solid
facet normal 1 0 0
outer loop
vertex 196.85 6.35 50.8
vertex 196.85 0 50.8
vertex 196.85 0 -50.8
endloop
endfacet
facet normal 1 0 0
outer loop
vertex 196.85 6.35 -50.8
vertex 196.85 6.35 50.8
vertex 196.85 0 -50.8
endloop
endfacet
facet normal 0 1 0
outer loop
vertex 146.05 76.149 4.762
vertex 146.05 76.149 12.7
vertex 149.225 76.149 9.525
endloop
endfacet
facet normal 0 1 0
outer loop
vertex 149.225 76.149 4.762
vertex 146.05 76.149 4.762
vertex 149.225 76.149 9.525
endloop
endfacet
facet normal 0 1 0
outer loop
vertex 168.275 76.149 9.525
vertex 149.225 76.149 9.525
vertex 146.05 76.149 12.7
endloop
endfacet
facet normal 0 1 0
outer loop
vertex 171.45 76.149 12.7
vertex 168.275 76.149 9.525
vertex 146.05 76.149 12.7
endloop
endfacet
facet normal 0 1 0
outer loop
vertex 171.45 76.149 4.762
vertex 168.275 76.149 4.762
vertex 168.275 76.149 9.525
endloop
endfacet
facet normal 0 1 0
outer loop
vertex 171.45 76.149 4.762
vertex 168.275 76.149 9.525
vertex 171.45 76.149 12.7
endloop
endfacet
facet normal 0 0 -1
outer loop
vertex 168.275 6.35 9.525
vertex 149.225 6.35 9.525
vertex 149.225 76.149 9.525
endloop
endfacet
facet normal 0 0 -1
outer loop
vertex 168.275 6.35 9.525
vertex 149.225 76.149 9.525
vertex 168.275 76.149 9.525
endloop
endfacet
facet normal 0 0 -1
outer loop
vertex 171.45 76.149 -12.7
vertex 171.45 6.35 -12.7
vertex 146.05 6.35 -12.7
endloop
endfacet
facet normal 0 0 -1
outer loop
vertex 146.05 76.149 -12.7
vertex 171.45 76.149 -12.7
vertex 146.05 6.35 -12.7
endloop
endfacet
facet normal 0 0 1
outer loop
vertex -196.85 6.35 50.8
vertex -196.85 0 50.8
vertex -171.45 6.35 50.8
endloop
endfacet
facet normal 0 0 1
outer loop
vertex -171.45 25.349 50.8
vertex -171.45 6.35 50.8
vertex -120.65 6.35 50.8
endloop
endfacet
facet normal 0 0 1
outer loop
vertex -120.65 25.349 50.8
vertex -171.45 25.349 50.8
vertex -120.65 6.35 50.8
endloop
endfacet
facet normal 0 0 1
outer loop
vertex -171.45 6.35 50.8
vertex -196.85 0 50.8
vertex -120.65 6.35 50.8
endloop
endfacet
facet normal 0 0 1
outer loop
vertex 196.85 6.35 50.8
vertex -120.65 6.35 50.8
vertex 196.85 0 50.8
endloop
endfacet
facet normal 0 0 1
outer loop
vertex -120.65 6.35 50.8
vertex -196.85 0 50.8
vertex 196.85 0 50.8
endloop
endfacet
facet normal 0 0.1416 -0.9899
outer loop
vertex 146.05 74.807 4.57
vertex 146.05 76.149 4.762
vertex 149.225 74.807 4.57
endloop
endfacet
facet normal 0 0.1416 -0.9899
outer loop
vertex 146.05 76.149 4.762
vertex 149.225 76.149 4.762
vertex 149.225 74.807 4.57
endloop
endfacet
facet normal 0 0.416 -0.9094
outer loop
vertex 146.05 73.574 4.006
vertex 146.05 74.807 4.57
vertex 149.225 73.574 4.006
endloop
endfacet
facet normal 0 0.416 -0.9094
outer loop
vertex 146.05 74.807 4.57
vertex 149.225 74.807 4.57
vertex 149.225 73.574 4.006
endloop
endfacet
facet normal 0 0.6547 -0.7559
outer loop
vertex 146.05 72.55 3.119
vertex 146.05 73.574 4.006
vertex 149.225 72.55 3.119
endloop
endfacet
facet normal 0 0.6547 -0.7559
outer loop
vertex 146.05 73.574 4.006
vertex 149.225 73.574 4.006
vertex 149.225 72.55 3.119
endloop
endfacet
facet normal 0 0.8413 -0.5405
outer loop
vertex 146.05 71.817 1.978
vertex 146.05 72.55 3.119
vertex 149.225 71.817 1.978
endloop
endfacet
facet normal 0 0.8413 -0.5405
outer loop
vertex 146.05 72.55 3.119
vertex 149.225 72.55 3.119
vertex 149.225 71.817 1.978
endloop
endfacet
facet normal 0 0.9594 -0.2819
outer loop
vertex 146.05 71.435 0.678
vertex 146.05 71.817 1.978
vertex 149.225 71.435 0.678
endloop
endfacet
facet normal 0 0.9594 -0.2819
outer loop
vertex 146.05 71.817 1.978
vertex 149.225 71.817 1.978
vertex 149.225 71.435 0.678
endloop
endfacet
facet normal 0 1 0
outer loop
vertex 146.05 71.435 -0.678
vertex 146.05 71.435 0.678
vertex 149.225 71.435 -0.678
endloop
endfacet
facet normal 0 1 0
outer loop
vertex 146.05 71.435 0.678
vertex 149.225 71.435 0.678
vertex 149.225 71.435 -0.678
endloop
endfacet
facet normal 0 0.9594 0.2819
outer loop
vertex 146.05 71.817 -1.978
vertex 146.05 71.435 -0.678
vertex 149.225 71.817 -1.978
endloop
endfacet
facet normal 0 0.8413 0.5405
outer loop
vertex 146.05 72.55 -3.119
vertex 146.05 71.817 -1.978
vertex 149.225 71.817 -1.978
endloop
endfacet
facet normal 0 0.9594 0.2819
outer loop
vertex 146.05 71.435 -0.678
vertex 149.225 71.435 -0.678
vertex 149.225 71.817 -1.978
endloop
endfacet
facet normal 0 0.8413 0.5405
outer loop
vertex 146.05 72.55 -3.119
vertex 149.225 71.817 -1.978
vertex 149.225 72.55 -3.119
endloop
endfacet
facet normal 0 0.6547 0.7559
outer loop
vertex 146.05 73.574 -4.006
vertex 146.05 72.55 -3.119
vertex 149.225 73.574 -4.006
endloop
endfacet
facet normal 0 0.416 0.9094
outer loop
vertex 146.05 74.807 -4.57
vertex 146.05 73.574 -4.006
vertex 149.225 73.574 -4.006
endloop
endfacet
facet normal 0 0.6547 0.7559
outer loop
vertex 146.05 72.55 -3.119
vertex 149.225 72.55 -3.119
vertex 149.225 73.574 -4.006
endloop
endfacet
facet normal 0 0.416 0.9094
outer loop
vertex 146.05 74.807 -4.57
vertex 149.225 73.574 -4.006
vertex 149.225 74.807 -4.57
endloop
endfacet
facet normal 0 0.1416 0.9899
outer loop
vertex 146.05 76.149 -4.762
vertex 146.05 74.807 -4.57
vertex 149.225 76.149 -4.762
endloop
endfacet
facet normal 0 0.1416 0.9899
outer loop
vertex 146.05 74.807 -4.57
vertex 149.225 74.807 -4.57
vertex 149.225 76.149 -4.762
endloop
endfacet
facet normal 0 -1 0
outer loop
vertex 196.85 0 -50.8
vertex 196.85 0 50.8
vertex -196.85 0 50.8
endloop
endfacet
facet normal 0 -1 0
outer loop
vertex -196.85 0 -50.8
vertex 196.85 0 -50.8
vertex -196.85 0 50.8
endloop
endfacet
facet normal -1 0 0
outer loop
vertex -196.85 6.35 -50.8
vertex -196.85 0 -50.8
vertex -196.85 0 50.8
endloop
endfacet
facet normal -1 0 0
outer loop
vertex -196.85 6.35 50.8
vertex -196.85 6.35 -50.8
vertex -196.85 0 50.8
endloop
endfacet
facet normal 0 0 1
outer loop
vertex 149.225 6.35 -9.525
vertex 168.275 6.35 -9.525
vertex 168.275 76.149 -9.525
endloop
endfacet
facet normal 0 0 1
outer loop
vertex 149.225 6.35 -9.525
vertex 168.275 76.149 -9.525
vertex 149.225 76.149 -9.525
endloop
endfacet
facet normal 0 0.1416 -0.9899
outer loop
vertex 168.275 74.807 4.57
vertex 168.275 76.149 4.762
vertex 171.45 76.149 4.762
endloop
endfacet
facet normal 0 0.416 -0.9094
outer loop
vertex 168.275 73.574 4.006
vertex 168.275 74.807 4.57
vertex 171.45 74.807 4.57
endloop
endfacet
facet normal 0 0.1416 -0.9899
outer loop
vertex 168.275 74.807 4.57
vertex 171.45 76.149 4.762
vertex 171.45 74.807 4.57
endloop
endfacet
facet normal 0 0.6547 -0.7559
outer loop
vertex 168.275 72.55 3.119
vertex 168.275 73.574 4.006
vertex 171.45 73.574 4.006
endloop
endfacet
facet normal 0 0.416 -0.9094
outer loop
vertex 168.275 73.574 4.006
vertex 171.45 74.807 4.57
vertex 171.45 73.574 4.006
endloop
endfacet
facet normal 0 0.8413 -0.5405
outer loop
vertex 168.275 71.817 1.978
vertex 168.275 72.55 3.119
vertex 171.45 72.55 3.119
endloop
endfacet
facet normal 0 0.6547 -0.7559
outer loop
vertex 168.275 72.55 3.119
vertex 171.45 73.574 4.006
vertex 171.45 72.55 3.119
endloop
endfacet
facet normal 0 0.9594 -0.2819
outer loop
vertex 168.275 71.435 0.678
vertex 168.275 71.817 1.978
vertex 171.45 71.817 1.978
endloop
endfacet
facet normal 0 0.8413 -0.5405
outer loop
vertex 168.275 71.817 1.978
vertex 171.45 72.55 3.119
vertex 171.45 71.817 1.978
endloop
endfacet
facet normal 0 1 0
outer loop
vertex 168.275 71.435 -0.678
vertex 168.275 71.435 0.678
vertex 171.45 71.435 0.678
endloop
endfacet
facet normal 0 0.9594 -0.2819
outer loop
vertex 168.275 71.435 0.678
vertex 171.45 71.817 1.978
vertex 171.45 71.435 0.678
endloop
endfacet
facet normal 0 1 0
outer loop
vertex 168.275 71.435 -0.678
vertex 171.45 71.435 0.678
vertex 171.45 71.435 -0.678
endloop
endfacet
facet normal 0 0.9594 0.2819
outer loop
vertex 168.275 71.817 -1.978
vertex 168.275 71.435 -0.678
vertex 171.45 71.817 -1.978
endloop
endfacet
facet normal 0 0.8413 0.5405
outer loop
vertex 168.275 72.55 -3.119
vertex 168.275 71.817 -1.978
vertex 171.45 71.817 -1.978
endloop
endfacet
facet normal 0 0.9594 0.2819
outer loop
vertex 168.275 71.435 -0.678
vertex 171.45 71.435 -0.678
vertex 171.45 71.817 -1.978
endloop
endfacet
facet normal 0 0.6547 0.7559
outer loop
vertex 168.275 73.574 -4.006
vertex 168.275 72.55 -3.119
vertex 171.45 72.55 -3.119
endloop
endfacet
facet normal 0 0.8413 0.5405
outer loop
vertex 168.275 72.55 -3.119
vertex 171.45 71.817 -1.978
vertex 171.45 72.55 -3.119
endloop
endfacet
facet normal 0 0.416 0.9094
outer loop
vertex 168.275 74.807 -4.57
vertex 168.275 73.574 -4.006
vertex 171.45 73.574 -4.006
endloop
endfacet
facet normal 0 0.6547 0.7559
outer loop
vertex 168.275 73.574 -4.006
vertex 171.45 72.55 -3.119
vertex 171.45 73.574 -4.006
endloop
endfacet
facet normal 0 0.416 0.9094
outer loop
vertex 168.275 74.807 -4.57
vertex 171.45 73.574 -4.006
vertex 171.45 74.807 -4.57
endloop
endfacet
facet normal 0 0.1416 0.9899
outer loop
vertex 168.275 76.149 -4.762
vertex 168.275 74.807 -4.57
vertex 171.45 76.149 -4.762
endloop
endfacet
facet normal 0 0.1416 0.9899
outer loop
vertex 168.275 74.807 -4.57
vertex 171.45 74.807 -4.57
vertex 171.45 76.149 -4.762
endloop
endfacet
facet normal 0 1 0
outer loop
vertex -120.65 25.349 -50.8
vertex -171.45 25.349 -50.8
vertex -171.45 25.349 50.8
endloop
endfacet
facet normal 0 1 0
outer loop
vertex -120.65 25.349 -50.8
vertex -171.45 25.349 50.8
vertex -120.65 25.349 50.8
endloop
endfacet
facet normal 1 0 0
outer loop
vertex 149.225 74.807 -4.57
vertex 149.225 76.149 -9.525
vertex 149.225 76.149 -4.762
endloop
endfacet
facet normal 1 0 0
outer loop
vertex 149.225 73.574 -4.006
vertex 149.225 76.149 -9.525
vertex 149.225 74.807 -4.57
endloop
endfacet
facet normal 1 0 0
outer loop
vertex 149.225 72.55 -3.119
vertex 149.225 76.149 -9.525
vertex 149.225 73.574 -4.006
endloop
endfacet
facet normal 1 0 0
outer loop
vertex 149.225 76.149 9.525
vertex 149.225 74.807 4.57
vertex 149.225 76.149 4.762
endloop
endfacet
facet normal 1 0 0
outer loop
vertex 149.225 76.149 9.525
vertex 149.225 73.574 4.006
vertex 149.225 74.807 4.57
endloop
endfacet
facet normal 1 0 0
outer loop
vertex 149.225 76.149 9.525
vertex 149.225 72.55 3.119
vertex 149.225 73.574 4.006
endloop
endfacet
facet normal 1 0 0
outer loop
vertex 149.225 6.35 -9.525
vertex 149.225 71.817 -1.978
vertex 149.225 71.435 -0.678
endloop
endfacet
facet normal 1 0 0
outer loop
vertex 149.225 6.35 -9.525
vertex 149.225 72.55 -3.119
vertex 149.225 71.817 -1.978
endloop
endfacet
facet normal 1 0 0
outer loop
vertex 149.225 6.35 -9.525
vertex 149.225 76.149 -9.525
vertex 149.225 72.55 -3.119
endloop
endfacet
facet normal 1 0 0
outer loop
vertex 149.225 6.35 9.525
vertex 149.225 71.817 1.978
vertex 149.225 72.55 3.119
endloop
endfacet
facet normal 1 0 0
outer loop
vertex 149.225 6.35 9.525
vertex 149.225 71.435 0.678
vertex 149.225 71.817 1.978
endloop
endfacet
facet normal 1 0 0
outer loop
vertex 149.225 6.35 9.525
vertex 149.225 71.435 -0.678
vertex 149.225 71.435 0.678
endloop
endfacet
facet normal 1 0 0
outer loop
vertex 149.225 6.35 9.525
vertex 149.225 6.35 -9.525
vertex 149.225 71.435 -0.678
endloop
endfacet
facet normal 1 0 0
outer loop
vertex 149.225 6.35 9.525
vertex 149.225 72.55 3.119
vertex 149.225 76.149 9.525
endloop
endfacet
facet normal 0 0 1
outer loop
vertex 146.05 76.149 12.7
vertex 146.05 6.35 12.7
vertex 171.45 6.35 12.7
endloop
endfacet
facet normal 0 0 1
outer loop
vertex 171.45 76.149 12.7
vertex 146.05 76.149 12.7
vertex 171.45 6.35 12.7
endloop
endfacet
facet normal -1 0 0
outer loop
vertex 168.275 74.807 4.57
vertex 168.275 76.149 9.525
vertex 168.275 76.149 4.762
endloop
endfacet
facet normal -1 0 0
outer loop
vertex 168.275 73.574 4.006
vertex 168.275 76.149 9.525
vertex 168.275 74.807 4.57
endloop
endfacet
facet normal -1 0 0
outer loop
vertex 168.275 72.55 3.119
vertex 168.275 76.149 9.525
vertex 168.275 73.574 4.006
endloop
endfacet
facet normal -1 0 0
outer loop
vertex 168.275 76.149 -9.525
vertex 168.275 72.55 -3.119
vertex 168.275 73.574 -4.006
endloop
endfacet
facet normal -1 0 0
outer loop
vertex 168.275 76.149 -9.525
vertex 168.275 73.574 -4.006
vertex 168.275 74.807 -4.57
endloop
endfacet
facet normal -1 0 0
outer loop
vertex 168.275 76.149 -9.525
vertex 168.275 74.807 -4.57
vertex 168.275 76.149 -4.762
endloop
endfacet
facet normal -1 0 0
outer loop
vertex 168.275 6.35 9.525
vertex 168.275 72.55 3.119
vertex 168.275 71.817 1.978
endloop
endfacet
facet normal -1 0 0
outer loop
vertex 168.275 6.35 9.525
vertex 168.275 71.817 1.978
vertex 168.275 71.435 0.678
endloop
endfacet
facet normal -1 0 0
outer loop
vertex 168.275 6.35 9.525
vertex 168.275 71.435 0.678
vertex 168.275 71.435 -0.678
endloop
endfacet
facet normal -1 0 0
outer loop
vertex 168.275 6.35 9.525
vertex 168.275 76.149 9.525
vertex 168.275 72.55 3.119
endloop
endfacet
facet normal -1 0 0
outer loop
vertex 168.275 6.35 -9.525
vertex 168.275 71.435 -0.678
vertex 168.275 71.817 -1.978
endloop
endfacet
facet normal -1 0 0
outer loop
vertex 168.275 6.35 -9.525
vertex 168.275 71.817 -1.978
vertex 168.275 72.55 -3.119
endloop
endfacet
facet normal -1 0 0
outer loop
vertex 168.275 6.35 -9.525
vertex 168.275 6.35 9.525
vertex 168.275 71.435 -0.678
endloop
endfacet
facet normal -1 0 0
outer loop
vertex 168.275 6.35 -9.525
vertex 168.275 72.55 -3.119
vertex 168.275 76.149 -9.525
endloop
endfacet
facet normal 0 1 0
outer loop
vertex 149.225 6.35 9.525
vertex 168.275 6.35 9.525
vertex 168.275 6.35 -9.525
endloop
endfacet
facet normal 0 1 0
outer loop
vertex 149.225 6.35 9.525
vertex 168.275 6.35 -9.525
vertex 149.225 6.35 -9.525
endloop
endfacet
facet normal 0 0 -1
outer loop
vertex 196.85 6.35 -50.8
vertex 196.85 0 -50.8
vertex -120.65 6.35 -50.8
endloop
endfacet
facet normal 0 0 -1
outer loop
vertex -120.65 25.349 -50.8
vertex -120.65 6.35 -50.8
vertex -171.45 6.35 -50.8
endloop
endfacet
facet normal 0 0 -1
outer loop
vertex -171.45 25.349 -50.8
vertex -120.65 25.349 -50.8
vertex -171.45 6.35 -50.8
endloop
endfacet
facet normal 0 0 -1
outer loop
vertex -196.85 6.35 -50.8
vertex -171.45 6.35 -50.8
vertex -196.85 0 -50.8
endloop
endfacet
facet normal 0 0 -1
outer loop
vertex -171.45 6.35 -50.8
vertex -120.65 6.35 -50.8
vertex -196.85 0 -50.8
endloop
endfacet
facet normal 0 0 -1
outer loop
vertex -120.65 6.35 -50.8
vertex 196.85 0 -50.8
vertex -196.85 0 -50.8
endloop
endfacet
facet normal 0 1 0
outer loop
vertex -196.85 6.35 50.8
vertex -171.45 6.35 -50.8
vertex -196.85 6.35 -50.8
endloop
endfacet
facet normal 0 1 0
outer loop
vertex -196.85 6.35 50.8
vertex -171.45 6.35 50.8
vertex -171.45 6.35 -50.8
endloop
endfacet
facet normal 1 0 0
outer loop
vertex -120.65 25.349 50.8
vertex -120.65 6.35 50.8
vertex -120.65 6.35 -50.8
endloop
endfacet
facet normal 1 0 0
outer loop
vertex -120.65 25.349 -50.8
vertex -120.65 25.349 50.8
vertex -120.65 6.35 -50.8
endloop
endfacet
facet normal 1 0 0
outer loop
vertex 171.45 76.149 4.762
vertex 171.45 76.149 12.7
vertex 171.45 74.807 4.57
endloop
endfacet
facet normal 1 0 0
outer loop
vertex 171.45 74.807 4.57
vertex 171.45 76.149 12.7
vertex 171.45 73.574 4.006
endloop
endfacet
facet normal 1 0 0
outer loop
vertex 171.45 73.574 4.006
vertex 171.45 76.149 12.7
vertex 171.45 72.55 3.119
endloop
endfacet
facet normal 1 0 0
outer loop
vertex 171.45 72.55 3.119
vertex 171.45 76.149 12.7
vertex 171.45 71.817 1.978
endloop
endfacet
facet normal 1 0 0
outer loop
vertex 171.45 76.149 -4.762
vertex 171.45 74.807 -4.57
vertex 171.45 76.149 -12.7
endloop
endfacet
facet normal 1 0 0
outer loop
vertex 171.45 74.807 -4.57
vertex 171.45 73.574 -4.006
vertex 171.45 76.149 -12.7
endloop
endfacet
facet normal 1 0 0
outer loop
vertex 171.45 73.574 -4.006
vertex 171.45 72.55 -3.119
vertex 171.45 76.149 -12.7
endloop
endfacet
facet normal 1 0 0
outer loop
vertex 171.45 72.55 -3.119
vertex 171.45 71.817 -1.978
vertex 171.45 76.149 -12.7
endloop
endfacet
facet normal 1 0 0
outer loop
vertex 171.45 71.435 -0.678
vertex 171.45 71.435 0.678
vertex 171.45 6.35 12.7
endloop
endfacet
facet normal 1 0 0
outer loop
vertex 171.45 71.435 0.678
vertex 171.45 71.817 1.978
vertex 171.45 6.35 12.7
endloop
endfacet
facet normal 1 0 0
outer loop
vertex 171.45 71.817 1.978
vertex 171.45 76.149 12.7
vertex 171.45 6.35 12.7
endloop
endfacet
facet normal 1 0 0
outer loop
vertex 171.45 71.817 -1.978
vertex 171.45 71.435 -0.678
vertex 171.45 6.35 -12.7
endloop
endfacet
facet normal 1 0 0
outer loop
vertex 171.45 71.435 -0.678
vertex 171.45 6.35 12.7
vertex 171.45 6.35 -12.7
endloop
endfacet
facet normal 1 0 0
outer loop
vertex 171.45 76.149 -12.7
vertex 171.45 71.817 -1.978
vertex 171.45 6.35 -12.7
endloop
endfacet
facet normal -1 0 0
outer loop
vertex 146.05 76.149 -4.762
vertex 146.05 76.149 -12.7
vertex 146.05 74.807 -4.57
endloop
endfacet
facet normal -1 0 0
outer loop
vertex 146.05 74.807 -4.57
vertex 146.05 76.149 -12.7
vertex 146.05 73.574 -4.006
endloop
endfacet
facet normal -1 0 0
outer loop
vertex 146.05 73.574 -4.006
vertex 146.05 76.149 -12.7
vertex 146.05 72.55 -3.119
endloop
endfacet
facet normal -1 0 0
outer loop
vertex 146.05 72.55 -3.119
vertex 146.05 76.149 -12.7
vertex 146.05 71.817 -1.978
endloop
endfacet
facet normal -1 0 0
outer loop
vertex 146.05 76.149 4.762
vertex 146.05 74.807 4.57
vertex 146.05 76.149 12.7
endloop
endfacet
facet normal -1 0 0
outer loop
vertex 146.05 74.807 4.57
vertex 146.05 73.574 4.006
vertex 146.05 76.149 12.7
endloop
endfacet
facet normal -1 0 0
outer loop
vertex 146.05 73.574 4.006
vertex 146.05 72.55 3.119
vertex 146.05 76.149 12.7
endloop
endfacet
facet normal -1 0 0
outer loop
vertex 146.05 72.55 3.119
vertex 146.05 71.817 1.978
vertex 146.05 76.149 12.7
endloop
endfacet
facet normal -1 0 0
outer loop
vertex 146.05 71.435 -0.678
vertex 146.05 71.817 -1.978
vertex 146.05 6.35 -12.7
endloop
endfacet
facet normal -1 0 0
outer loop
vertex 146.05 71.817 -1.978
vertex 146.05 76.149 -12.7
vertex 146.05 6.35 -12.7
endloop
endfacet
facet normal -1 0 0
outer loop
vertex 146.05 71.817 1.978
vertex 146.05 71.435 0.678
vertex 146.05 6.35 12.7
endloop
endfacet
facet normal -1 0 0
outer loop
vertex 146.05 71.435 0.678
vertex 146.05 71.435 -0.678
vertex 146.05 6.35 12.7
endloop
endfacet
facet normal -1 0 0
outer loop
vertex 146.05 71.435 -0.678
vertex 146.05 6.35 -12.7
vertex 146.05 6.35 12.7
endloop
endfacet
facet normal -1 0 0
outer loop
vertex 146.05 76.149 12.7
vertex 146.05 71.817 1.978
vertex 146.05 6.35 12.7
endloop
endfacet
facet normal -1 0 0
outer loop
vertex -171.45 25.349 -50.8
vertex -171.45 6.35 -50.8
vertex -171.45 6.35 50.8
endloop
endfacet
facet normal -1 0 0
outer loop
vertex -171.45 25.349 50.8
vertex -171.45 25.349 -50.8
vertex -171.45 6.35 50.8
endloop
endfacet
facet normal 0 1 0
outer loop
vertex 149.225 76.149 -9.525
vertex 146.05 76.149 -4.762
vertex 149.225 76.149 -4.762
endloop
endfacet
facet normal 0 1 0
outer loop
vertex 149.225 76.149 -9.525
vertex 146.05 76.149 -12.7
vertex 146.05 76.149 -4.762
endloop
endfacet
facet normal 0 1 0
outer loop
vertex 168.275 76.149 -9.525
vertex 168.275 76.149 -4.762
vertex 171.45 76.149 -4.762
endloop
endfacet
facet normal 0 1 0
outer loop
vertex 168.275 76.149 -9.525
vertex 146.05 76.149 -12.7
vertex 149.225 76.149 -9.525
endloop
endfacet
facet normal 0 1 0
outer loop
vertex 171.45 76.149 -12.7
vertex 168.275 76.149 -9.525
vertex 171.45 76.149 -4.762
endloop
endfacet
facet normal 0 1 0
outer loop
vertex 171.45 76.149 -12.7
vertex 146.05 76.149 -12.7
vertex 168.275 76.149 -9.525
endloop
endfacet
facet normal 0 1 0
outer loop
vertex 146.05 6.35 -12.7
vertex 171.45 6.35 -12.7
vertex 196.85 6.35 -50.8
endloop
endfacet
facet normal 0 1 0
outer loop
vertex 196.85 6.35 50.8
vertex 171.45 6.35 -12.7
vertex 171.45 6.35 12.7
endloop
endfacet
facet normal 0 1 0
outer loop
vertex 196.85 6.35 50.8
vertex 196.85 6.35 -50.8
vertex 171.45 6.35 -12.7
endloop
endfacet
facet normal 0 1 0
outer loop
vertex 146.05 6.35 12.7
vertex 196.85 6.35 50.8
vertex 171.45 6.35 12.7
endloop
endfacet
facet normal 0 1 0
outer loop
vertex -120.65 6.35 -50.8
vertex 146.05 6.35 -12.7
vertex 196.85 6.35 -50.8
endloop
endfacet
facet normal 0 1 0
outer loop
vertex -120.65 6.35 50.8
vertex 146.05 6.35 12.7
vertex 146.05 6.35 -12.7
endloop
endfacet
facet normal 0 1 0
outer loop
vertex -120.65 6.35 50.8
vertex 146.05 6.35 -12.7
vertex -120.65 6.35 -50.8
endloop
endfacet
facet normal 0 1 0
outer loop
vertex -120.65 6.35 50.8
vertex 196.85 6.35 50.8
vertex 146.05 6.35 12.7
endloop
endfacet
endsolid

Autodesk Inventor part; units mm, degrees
ref_plane "XZ Plane" through (0, 0, 0) normal (0, 1, 0) x (-1, 0, 0)
sketch "Sketch1" plane through (0, 0, 0) normal (0, 1, 0) x (-1, 0, 0)
  line L0 (196.85, 50.8) -> (-196.85, 50.8)
  line L1 (-196.85, 50.8) -> (-196.85, -50.8)
  line L2 (-196.85, -50.8) -> (196.85, -50.8)
  line L3 (196.85, -50.8) -> (196.85, 50.8)
  line L4 (196.85, 50.8) -> (-196.85, -50.8) construction
  line L5 (-196.85, 50.8) -> (196.85, -50.8) construction
  point P0 (0, 0)
  dimension "d0" = 101.6
  dimension "d1" = 393.7
extrude "Extrusion1" add sketch "Sketch1" along normal blind 6.35
sketch "Sketch2" plane through (0, 6.35, 0) normal (0, 1, 0) x (1, 0, 0)
  line L0 (146.05, -12.7) -> (171.45, -12.7)
  line L1 (171.45, -12.7) -> (171.45, 12.7)
  line L2 (171.45, 12.7) -> (146.05, 12.7)
  line L3 (146.05, 12.7) -> (146.05, -12.7)
  line L4 (146.05, -12.7) -> (171.45, 12.7) construction
  line L5 (171.45, -12.7) -> (146.05, 12.7) construction
  line L6 (149.225, -9.525) -> (168.275, -9.525)
  line L7 (168.275, -9.525) -> (168.275, 9.525)
  line L8 (168.275, 9.525) -> (149.225, 9.525)
  line L9 (149.225, 9.525) -> (149.225, -9.525)
  line L10 (149.225, -9.525) -> (168.275, 9.525) construction
  line L11 (168.275, -9.525) -> (149.225, 9.525) construction
  line L12 (196.85, -50.8) -> (196.85, 50.8) projected
  line L13 (-196.85, -50.8) -> (196.85, -50.8) projected
  point P0 (0, 0)
  point P1 (158.75, 0)
  dimension "d4" = 25.4
  dimension "d5" = 25.4
  dimension "d6" = 3.175
  dimension "d7" = 3.175
  dimension "d8" = 25.4
  dimension "d14" = 38.1
extrude "Extrusion2" add sketch "Sketch2" along normal blind 69.7992
sketch "Sketch3" plane through (171.45, 6.35, 12.7) normal (1, 0, 0) x (0, 0, -1)
  line L0 (0, 69.7992) -> (25.4, 69.7992) projected
  circle A0 centre (12.7, 69.7992) radius 4.7625
  point P0 (12.7, -6.35)
  dimension "d11" = 9.525
extrude "Extrusion3" cut sketch "Sketch3" against normal through all
sketch "Sketch4" plane through (0, 6.35, 0) normal (0, 1, 0) x (1, 0, 0)
  line L0 (-171.45, -50.8) -> (-120.65, -50.8)
  line L1 (-120.65, -50.8) -> (-120.65, 50.8)
  line L2 (-120.65, 50.8) -> (-171.45, 50.8)
  line L3 (-171.45, 50.8) -> (-171.45, -50.8)
  line L4 (-171.45, -50.8) -> (-120.65, 50.8) construction
  line L5 (-120.65, -50.8) -> (-171.45, 50.8) construction
  line L6 (-196.85, 50.8) -> (-196.85, -50.8) projected
  line L7 (-196.85, -50.8) -> (196.85, -50.8) projected
  point P0 (0, 0)
  point P1 (-146.05, 0)
  dimension "d15" = 50.8
  dimension "d16" = 25.4
  dimension "d17" = 101.6
extrude "Extrusion4" add sketch "Sketch4" along normal blind 18.9992
sketch "Sketch5" plane through (0, 6.35, 0) normal (0, 1, 0) x (1, 0, 0)
  line L0 (196.85, 50.8) -> (-196.85, 50.8) projected
  line L1 (-101.6, 50.8) -> (101.6, 50.8)
  line L2 (101.6, 50.8) -> (101.6, 25.4)
  line L3 (101.6, 25.4) -> (-101.6, 25.4)
  line L4 (-101.6, 25.4) -> (-101.6, 50.8)
  point P0 (0, 0)
  dimension "d20" = 101.6
  dimension "d21" = 101.6
  dimension "d22" = 25.4
sketch "Sketch7" plane through (0, 6.35, 0) normal (0, 1, 0) x (1, 0, 0)
  line L0 (-196.85, -50.8) -> (196.85, -50.8) projected
  line L1 (-101.6, -50.8) -> (101.6, -50.8)
  line L2 (101.6, -50.8) -> (101.6, 0)
  line L3 (101.6, 0) -> (-101.6, 0)
  line L4 (-101.6, 0) -> (-101.6, -50.8)
  line L5 (-101.6, 25.4) -> (-101.6, 50.8) projected
  line L6 (101.6, 50.8) -> (101.6, 25.4) projected
  line L7 (101.6, 25.4) -> (-101.6, 25.4) projected
  point P0 (0, 0)
  dimension "d28" = 25.4
equation "\"d0\" = width"
equation "\"d1\" = length"
equation "\"d2\" = thickness"
equation "\"width\" = 101.6"
equation "\"length\" = 393.7"
equation "\"thickness\" = 6.35"
properties part number "SupportPlateToAttachToRobotBase" material "Aluminum 6061"
